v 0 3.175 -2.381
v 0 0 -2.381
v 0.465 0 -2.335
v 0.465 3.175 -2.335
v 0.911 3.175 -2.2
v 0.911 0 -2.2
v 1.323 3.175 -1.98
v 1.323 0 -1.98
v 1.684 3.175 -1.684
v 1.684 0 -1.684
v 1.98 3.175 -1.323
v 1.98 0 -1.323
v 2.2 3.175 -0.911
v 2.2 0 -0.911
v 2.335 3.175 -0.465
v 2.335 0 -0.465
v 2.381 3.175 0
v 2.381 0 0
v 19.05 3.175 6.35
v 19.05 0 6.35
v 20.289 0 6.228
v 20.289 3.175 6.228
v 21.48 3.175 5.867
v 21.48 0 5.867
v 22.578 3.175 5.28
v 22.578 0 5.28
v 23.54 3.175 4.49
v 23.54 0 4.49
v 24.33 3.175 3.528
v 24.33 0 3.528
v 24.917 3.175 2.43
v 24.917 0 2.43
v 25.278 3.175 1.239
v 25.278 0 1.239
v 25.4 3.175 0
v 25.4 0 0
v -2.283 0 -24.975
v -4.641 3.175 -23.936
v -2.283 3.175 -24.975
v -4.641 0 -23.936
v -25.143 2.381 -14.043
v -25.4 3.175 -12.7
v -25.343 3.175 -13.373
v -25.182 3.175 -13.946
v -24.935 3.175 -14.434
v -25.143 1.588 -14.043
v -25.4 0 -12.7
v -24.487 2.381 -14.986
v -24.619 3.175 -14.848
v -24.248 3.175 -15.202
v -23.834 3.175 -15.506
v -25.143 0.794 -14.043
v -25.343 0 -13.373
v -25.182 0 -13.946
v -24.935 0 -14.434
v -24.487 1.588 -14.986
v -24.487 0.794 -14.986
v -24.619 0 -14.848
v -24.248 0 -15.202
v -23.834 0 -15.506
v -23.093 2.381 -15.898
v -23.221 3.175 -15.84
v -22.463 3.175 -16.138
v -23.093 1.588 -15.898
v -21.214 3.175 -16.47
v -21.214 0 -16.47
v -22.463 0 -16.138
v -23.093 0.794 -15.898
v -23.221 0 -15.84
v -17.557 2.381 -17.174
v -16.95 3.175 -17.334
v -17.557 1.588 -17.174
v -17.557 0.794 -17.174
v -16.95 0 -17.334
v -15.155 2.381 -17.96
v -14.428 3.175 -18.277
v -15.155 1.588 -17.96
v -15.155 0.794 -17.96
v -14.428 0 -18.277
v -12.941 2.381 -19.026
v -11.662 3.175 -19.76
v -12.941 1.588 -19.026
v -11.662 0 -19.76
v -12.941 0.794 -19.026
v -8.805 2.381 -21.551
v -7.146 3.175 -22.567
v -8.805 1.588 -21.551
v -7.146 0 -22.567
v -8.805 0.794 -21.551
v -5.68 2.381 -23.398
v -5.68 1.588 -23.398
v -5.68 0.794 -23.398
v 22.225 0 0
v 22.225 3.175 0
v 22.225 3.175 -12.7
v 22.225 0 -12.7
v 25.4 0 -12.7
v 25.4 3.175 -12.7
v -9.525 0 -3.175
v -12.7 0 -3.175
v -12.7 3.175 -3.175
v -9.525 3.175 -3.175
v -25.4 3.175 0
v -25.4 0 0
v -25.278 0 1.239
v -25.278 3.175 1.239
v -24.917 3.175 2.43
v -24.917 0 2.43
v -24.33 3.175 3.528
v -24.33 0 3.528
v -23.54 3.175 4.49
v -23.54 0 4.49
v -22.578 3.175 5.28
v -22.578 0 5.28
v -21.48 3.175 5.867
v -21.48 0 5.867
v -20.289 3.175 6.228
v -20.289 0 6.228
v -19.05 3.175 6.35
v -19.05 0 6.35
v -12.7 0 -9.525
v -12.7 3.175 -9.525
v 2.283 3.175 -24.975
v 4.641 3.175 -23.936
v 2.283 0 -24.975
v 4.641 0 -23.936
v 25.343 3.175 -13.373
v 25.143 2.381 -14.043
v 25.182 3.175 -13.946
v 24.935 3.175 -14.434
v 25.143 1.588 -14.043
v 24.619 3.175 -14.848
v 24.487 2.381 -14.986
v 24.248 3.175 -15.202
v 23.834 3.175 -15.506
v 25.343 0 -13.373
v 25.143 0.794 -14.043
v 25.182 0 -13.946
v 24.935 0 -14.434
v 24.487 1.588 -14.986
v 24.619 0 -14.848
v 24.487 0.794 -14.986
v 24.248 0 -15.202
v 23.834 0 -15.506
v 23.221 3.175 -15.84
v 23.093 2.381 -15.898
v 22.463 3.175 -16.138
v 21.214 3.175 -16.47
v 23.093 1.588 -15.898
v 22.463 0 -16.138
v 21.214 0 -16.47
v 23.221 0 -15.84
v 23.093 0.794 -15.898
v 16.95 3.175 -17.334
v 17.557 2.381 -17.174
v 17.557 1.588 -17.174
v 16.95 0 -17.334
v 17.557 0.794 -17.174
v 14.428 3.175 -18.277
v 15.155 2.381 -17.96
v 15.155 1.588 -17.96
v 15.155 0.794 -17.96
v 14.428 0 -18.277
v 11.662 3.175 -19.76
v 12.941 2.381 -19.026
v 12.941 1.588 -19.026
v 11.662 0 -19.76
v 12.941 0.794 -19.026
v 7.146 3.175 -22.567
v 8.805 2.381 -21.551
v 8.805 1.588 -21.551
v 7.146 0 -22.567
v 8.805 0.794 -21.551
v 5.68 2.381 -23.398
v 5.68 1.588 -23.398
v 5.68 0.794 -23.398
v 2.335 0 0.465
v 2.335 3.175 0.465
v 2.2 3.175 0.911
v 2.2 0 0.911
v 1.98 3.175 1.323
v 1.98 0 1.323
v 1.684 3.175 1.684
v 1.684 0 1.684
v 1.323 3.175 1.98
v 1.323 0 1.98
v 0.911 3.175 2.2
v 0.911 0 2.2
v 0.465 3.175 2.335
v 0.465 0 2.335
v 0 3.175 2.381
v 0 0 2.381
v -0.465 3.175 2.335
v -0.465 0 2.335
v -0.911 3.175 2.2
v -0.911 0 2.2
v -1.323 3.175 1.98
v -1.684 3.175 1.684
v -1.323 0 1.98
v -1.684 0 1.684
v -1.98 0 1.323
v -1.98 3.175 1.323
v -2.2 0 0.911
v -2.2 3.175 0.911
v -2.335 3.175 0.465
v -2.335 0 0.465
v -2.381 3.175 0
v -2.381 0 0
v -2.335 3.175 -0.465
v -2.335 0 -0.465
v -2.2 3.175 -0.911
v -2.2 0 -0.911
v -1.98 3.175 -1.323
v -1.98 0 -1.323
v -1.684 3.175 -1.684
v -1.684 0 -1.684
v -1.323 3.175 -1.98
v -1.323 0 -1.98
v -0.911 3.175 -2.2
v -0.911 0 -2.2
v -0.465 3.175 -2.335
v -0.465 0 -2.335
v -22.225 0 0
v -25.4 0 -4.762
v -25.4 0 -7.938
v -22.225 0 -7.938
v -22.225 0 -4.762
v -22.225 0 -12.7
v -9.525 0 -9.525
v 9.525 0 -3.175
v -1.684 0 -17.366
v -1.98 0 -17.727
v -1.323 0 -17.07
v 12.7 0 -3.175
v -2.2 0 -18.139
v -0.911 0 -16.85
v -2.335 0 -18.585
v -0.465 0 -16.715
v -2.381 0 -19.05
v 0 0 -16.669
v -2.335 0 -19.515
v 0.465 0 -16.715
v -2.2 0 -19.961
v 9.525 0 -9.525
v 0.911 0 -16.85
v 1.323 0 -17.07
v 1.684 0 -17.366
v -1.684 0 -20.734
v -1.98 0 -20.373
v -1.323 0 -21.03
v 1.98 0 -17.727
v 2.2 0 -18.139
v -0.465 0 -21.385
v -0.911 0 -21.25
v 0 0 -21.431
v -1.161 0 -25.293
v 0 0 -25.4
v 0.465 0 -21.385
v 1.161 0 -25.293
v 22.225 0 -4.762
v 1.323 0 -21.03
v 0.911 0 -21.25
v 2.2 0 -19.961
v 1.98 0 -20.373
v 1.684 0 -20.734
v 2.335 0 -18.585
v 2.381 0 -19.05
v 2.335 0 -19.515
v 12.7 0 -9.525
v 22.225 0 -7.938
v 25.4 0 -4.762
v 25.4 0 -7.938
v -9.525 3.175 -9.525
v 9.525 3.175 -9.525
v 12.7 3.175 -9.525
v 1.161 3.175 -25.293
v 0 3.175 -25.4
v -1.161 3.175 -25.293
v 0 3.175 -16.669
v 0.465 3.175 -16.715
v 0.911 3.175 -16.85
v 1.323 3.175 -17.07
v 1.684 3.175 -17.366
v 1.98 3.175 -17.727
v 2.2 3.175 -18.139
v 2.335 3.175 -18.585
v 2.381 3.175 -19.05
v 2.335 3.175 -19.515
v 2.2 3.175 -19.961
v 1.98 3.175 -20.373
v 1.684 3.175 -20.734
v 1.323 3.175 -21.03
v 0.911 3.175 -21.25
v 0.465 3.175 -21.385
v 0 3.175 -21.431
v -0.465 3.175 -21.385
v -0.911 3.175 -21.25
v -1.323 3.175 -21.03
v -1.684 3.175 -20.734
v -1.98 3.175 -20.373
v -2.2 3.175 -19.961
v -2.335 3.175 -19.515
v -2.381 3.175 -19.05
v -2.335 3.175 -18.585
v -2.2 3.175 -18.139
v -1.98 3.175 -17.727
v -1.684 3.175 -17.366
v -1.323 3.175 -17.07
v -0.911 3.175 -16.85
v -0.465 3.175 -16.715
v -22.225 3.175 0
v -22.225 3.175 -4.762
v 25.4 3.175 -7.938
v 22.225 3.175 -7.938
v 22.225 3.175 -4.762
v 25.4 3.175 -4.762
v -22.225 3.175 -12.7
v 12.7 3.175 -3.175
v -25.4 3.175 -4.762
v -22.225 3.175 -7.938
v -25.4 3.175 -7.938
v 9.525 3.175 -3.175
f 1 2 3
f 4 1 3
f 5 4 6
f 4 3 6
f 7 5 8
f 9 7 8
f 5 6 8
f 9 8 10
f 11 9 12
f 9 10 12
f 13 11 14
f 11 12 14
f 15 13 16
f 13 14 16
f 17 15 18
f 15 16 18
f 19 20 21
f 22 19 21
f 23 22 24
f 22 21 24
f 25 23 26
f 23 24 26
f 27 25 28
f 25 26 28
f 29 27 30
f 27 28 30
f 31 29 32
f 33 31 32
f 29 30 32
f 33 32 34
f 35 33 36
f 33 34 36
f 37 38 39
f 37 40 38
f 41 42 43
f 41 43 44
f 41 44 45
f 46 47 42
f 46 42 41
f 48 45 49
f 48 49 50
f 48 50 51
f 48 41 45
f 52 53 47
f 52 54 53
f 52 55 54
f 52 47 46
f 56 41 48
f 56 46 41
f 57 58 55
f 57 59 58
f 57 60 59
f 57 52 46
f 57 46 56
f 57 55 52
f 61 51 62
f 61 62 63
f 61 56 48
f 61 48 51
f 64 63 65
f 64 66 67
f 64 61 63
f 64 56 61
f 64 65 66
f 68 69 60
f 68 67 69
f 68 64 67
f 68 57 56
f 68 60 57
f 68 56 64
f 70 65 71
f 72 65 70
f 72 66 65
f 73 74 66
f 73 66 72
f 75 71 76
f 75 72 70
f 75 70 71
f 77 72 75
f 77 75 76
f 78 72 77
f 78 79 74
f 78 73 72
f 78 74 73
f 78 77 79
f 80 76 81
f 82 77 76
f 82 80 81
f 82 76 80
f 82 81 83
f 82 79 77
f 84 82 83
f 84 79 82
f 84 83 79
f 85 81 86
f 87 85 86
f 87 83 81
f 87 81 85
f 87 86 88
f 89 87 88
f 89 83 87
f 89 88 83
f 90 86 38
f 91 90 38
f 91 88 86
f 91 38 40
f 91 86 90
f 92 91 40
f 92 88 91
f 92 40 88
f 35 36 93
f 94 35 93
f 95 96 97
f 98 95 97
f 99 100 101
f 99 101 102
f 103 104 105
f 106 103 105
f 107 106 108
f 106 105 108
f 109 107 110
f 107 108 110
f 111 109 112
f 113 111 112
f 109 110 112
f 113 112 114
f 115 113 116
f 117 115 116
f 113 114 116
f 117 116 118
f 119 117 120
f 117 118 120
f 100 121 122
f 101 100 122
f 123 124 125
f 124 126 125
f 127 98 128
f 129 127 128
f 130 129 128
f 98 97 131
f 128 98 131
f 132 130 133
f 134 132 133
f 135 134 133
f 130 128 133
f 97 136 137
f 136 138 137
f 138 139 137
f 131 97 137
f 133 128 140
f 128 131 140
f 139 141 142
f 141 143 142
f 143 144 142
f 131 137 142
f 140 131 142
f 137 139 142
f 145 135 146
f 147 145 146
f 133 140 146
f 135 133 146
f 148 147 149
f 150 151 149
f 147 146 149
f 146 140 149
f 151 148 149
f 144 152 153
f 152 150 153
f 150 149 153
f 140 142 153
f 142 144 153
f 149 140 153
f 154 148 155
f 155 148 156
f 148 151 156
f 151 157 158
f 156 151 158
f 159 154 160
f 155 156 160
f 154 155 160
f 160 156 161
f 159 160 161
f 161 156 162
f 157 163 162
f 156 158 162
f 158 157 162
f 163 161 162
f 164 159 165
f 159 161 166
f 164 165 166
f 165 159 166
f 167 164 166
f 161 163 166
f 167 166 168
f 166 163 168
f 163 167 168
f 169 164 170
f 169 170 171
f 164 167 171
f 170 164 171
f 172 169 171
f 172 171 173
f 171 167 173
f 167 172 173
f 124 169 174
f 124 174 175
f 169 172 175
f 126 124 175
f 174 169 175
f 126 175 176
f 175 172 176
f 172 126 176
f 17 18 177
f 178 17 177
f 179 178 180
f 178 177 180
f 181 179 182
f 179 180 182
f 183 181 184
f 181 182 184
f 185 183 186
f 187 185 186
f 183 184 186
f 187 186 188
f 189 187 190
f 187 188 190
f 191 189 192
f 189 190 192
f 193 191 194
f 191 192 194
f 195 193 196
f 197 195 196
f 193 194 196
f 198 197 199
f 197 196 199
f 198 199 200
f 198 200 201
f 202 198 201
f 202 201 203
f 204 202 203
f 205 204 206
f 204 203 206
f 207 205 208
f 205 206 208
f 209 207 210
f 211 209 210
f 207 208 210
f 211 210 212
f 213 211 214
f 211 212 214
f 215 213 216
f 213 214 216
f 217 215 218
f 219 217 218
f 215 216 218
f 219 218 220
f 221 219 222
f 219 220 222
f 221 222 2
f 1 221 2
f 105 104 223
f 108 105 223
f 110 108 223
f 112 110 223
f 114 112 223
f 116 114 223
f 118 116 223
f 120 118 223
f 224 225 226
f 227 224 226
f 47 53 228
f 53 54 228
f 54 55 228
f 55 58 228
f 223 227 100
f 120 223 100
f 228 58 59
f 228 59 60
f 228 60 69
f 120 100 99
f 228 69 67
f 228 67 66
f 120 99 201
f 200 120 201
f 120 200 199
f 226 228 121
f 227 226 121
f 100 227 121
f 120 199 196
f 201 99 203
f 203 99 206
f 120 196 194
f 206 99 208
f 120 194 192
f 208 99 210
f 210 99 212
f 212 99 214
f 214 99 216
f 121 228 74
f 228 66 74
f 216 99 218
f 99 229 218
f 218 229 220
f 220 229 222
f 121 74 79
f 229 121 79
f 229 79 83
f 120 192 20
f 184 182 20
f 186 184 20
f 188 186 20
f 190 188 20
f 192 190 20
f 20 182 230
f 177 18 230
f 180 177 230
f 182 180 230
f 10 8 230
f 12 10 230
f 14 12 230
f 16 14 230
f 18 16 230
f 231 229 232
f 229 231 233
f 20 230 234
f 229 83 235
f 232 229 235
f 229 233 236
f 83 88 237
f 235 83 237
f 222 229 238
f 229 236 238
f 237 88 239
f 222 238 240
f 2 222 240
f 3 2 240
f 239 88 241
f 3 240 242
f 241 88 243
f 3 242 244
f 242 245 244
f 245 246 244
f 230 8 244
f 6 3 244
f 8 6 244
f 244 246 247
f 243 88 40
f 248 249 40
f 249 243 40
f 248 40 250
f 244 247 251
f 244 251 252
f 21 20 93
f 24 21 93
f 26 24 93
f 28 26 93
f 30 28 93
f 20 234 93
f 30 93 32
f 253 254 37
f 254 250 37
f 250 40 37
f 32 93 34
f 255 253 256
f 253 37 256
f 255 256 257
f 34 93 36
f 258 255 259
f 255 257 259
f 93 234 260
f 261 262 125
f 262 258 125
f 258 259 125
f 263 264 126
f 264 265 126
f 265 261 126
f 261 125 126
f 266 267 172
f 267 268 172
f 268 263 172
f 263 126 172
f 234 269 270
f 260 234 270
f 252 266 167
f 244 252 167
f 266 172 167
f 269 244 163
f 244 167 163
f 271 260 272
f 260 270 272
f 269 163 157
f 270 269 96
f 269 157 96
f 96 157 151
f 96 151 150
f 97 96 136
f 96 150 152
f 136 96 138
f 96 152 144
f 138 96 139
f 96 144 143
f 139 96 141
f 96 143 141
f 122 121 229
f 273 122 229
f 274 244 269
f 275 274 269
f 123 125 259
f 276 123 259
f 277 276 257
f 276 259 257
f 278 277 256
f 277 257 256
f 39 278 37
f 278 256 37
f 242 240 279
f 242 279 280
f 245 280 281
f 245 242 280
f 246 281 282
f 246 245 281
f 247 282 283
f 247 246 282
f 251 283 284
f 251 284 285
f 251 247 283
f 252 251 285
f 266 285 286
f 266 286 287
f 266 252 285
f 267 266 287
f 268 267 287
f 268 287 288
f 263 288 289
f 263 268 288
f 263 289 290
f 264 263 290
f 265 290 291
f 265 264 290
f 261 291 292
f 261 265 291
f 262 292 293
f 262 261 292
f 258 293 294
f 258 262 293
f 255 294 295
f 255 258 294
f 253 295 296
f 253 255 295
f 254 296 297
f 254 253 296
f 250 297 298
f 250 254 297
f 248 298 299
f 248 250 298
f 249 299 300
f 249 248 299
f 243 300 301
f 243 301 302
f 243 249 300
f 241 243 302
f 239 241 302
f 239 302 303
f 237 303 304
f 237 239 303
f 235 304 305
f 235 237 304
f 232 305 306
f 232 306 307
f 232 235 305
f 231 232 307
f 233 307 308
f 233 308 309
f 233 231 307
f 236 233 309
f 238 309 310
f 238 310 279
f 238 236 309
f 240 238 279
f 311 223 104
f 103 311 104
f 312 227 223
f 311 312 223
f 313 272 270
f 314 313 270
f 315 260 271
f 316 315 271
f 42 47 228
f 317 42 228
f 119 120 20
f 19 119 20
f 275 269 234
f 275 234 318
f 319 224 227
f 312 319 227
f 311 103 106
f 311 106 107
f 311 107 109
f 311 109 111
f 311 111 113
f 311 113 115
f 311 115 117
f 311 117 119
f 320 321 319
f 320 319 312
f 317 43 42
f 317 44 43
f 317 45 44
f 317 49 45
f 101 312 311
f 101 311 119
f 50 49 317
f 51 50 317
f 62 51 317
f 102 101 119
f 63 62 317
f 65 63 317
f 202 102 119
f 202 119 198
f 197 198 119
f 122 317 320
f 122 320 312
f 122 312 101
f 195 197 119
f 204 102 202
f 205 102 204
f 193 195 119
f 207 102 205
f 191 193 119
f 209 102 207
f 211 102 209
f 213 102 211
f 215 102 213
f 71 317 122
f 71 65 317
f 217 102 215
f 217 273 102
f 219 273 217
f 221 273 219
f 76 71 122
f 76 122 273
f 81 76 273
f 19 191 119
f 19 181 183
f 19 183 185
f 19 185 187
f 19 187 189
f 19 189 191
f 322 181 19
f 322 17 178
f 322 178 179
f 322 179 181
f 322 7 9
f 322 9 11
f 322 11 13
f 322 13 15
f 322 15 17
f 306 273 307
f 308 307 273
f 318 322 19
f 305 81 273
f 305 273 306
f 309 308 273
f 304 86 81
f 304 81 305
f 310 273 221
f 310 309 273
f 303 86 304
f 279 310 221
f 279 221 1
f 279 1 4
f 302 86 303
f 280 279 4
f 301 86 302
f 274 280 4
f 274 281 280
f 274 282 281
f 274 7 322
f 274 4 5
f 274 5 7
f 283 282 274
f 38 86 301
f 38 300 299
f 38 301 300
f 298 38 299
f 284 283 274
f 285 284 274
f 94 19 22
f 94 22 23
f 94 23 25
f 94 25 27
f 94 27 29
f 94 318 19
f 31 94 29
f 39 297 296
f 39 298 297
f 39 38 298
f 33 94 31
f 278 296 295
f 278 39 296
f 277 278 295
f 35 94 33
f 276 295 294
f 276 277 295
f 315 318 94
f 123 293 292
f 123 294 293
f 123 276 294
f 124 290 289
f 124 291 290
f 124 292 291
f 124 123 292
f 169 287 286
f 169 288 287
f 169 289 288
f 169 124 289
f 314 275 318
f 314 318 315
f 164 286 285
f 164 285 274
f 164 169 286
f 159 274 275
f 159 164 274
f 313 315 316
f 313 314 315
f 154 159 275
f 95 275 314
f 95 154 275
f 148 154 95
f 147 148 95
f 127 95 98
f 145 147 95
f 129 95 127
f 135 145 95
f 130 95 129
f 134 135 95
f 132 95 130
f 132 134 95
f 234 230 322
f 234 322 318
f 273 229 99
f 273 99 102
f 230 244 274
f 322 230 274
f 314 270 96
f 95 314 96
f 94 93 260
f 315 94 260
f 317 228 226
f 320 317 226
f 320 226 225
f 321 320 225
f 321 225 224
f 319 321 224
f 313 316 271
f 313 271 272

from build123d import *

# Parameters (mm, degrees)
SKETCH1_R           = 2.38125
BOSS_EXTRUDE1_DEPTH = 3.175
CAVITY1_START       = -9.525
CAVITY1_OUTLINE_W   = 3.175
CAVITY1_OUTLINE_H   = 3.175
CAVITY1_DEPTH       = 6.35


# Read off the part's stored shape, not the designer's step: Cavity1
with BuildPart() as part:
    # Sketch1 → Boss-Extrude1 (new body)
    # profile 1 of 4: a face of its own
    with BuildSketch(Plane(origin=(0, 0, 0), x_dir=(1, 0, 0), z_dir=(0, 1, 0))):
        with BuildLine():
            Line((-19.05, -6.35), (19.05, -6.35))
            ThreePointArc((19.05, -6.35), (23.540128061, -4.490128061), (25.4, 0))
            Line((25.4, 0), (22.225, 0))
            Line((22.225, 0), (22.225, 4.7625))
            Line((22.225, 4.7625), (25.4, 4.7625))
            Line((25.4, 4.7625), (25.4, 7.9375))
            Line((25.4, 7.9375), (22.225, 7.9375))
            Line((22.225, 7.9375), (22.225, 12.7))
            Line((22.225, 12.7), (0, 12.7))
            Line((0, 12.7), (-22.225, 12.7))
            Line((-22.225, 12.7), (-22.225, 7.9375))
            Line((-22.225, 7.9375), (-25.4, 7.9375))
            Line((-25.4, 7.9375), (-25.4, 4.7625))
            Line((-25.4, 4.7625), (-22.225, 4.7625))
            Line((-22.225, 4.7625), (-22.225, 0))
            Line((-22.225, 0), (-25.4, 0))
            ThreePointArc((-25.4, 0), (-23.540128061, -4.490128061), (-19.05, -6.35))
        make_face()
        with BuildLine():
            ThreePointArc((0, 2.38125), (1.683798023, 1.683798023), (2.38125, 0))
            ThreePointArc((2.38125, 0), (-1.683798023, -1.683798023), (0, 2.38125))
        make_face(mode=Mode.SUBTRACT)
    # profile 2 of 4: a face of its own
    with BuildSketch(Plane(origin=(0, 0, 0), x_dir=(1, 0, 0), z_dir=(0, 1, 0))):
        with BuildLine():
            Line((0, 12.7), (22.225, 12.7))
            Line((22.225, 12.7), (25.4, 12.7))
            add(Edge.make_bspline(
                [(25.4, 12.7), (25.4, 13.75902599), (23.890330765, 16.528390246), (16.188410672, 16.612194154), (9.505907267, 21.233154333), (4.692379923, 24.046890427), (2.283434696, 24.975236366)],
                knots=[0, 0, 0, 0, 0.091573424, 0.361911299, 0.725975428, 1, 1, 1, 1], degree=3))
            ThreePointArc((2.283434696, 24.975236366), (5.235566365, 22.643235984), (6.35, 19.05))
            ThreePointArc((6.35, 19.05), (4.490128061, 14.559871939), (0, 12.7))
        make_face()
    # profile 3 of 4: a face of its own
    with BuildSketch(Plane(origin=(0, 0, 0), x_dir=(1, 0, 0), z_dir=(0, 1, 0))):
        with BuildLine():
            Line((-25.4, 12.7), (-22.225, 12.7))
            Line((-22.225, 12.7), (0, 12.7))
            ThreePointArc((0, 12.7), (-6.242906011, 17.888697051), (-2.283434696, 24.975236366))
            add(Edge.make_bspline(
                [(-25.4, 12.7), (-25.4, 13.75902599), (-23.890330765, 16.528390246), (-16.188410672, 16.612194154), (-9.505907267, 21.233154333), (-4.692379923, 24.046890427), (-2.283434696, 24.975236366)],
                knots=[0, 0, 0, 0, 0.091573424, 0.361911299, 0.725975428, 1, 1, 1, 1], degree=3))
        make_face()
    # profile 4 of 4: a face of its own
    with BuildSketch(Plane(origin=(0, 0, 0), x_dir=(1, 0, 0), z_dir=(0, 1, 0))):
        with BuildLine():
            ThreePointArc((-2.283434696, 24.975236366), (-6.242906011, 17.888697051), (0, 12.7))
            ThreePointArc((0, 12.7), (4.490128061, 14.559871939), (6.35, 19.05))
            ThreePointArc((6.35, 19.05), (5.235566365, 22.643235984), (2.283434696, 24.975236366))
            ThreePointArc((2.283434696, 24.975236366), (0, 25.4), (-2.283434696, 24.975236366))
        make_face()
        with Locations(Location((0, 19.05, 0), (0, 0, 270))):
            Circle(SKETCH1_R, mode=Mode.SUBTRACT)
    extrude(amount=BOSS_EXTRUDE1_DEPTH)

    # Cavity1 outline → Cavity1 (cut)
    with BuildSketch(Plane.XY.offset(CAVITY1_START)):
        with Locations((11.1125, 1.5875)):
            Rectangle(CAVITY1_OUTLINE_W, CAVITY1_OUTLINE_H)
        with Locations((-11.1125, 1.5875)):
            Rectangle(CAVITY1_OUTLINE_W, CAVITY1_OUTLINE_H)
    extrude(amount=CAVITY1_DEPTH, mode=Mode.SUBTRACT)


solid = part.part
